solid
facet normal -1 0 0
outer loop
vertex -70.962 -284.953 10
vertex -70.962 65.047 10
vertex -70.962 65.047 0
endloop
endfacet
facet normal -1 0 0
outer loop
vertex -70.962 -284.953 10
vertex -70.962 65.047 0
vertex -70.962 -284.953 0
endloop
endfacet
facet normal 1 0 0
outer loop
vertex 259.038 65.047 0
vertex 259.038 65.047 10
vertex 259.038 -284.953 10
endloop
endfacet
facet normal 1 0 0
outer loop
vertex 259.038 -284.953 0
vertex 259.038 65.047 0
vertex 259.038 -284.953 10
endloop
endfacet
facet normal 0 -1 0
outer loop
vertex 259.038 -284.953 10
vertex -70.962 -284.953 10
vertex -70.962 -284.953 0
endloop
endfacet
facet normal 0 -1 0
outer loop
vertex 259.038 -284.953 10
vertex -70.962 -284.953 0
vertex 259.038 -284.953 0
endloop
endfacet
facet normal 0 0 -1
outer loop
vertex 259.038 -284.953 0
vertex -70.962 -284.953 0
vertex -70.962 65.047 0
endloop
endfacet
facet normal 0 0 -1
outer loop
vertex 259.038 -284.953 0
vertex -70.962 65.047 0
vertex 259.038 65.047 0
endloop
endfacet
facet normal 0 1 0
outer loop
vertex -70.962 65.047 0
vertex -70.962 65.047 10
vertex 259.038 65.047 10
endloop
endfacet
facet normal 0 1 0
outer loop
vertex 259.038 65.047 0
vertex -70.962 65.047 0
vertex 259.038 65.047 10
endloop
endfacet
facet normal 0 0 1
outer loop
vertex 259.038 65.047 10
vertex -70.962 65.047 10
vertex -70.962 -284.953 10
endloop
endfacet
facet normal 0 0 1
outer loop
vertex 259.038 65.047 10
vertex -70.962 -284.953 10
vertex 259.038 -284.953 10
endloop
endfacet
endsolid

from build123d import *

# Parameters (mm, degrees)
F0_W      = 330
F0_H      = 350
F1_DEPTH  = 10
F1_FACE_W = 330
F1_FACE_H = 350
F2_DEPTH  = 2
F2_FACE_W = 330
F2_FACE_H = 350
F3_DEPTH  = 2


with BuildPart() as f1:
    # F0 (on Top) → F1 (new body)
    with BuildSketch(Plane.XY):
        with Locations((94.038462, -109.95281)):
            Rectangle(F0_W, F0_H)
    extrude(amount=F1_DEPTH)

    # F1_face (on face) → F2 (join)
    with BuildSketch(Plane(origin=(94.038462, -109.95281, 0), x_dir=(1, 0, 0), z_dir=(0, 0, -1))):
        Rectangle(F1_FACE_W, F1_FACE_H)
    extrude(amount=F2_DEPTH)

    # F2_face (on face) → F3 (cut)
    with BuildSketch(Plane(origin=(94.038462, -109.95281, -2), x_dir=(1, 0, 0), z_dir=(0, 0, -1))):
        Rectangle(F2_FACE_W, F2_FACE_H)
    extrude(amount=-F3_DEPTH, mode=Mode.SUBTRACT)


solid = f1.part
